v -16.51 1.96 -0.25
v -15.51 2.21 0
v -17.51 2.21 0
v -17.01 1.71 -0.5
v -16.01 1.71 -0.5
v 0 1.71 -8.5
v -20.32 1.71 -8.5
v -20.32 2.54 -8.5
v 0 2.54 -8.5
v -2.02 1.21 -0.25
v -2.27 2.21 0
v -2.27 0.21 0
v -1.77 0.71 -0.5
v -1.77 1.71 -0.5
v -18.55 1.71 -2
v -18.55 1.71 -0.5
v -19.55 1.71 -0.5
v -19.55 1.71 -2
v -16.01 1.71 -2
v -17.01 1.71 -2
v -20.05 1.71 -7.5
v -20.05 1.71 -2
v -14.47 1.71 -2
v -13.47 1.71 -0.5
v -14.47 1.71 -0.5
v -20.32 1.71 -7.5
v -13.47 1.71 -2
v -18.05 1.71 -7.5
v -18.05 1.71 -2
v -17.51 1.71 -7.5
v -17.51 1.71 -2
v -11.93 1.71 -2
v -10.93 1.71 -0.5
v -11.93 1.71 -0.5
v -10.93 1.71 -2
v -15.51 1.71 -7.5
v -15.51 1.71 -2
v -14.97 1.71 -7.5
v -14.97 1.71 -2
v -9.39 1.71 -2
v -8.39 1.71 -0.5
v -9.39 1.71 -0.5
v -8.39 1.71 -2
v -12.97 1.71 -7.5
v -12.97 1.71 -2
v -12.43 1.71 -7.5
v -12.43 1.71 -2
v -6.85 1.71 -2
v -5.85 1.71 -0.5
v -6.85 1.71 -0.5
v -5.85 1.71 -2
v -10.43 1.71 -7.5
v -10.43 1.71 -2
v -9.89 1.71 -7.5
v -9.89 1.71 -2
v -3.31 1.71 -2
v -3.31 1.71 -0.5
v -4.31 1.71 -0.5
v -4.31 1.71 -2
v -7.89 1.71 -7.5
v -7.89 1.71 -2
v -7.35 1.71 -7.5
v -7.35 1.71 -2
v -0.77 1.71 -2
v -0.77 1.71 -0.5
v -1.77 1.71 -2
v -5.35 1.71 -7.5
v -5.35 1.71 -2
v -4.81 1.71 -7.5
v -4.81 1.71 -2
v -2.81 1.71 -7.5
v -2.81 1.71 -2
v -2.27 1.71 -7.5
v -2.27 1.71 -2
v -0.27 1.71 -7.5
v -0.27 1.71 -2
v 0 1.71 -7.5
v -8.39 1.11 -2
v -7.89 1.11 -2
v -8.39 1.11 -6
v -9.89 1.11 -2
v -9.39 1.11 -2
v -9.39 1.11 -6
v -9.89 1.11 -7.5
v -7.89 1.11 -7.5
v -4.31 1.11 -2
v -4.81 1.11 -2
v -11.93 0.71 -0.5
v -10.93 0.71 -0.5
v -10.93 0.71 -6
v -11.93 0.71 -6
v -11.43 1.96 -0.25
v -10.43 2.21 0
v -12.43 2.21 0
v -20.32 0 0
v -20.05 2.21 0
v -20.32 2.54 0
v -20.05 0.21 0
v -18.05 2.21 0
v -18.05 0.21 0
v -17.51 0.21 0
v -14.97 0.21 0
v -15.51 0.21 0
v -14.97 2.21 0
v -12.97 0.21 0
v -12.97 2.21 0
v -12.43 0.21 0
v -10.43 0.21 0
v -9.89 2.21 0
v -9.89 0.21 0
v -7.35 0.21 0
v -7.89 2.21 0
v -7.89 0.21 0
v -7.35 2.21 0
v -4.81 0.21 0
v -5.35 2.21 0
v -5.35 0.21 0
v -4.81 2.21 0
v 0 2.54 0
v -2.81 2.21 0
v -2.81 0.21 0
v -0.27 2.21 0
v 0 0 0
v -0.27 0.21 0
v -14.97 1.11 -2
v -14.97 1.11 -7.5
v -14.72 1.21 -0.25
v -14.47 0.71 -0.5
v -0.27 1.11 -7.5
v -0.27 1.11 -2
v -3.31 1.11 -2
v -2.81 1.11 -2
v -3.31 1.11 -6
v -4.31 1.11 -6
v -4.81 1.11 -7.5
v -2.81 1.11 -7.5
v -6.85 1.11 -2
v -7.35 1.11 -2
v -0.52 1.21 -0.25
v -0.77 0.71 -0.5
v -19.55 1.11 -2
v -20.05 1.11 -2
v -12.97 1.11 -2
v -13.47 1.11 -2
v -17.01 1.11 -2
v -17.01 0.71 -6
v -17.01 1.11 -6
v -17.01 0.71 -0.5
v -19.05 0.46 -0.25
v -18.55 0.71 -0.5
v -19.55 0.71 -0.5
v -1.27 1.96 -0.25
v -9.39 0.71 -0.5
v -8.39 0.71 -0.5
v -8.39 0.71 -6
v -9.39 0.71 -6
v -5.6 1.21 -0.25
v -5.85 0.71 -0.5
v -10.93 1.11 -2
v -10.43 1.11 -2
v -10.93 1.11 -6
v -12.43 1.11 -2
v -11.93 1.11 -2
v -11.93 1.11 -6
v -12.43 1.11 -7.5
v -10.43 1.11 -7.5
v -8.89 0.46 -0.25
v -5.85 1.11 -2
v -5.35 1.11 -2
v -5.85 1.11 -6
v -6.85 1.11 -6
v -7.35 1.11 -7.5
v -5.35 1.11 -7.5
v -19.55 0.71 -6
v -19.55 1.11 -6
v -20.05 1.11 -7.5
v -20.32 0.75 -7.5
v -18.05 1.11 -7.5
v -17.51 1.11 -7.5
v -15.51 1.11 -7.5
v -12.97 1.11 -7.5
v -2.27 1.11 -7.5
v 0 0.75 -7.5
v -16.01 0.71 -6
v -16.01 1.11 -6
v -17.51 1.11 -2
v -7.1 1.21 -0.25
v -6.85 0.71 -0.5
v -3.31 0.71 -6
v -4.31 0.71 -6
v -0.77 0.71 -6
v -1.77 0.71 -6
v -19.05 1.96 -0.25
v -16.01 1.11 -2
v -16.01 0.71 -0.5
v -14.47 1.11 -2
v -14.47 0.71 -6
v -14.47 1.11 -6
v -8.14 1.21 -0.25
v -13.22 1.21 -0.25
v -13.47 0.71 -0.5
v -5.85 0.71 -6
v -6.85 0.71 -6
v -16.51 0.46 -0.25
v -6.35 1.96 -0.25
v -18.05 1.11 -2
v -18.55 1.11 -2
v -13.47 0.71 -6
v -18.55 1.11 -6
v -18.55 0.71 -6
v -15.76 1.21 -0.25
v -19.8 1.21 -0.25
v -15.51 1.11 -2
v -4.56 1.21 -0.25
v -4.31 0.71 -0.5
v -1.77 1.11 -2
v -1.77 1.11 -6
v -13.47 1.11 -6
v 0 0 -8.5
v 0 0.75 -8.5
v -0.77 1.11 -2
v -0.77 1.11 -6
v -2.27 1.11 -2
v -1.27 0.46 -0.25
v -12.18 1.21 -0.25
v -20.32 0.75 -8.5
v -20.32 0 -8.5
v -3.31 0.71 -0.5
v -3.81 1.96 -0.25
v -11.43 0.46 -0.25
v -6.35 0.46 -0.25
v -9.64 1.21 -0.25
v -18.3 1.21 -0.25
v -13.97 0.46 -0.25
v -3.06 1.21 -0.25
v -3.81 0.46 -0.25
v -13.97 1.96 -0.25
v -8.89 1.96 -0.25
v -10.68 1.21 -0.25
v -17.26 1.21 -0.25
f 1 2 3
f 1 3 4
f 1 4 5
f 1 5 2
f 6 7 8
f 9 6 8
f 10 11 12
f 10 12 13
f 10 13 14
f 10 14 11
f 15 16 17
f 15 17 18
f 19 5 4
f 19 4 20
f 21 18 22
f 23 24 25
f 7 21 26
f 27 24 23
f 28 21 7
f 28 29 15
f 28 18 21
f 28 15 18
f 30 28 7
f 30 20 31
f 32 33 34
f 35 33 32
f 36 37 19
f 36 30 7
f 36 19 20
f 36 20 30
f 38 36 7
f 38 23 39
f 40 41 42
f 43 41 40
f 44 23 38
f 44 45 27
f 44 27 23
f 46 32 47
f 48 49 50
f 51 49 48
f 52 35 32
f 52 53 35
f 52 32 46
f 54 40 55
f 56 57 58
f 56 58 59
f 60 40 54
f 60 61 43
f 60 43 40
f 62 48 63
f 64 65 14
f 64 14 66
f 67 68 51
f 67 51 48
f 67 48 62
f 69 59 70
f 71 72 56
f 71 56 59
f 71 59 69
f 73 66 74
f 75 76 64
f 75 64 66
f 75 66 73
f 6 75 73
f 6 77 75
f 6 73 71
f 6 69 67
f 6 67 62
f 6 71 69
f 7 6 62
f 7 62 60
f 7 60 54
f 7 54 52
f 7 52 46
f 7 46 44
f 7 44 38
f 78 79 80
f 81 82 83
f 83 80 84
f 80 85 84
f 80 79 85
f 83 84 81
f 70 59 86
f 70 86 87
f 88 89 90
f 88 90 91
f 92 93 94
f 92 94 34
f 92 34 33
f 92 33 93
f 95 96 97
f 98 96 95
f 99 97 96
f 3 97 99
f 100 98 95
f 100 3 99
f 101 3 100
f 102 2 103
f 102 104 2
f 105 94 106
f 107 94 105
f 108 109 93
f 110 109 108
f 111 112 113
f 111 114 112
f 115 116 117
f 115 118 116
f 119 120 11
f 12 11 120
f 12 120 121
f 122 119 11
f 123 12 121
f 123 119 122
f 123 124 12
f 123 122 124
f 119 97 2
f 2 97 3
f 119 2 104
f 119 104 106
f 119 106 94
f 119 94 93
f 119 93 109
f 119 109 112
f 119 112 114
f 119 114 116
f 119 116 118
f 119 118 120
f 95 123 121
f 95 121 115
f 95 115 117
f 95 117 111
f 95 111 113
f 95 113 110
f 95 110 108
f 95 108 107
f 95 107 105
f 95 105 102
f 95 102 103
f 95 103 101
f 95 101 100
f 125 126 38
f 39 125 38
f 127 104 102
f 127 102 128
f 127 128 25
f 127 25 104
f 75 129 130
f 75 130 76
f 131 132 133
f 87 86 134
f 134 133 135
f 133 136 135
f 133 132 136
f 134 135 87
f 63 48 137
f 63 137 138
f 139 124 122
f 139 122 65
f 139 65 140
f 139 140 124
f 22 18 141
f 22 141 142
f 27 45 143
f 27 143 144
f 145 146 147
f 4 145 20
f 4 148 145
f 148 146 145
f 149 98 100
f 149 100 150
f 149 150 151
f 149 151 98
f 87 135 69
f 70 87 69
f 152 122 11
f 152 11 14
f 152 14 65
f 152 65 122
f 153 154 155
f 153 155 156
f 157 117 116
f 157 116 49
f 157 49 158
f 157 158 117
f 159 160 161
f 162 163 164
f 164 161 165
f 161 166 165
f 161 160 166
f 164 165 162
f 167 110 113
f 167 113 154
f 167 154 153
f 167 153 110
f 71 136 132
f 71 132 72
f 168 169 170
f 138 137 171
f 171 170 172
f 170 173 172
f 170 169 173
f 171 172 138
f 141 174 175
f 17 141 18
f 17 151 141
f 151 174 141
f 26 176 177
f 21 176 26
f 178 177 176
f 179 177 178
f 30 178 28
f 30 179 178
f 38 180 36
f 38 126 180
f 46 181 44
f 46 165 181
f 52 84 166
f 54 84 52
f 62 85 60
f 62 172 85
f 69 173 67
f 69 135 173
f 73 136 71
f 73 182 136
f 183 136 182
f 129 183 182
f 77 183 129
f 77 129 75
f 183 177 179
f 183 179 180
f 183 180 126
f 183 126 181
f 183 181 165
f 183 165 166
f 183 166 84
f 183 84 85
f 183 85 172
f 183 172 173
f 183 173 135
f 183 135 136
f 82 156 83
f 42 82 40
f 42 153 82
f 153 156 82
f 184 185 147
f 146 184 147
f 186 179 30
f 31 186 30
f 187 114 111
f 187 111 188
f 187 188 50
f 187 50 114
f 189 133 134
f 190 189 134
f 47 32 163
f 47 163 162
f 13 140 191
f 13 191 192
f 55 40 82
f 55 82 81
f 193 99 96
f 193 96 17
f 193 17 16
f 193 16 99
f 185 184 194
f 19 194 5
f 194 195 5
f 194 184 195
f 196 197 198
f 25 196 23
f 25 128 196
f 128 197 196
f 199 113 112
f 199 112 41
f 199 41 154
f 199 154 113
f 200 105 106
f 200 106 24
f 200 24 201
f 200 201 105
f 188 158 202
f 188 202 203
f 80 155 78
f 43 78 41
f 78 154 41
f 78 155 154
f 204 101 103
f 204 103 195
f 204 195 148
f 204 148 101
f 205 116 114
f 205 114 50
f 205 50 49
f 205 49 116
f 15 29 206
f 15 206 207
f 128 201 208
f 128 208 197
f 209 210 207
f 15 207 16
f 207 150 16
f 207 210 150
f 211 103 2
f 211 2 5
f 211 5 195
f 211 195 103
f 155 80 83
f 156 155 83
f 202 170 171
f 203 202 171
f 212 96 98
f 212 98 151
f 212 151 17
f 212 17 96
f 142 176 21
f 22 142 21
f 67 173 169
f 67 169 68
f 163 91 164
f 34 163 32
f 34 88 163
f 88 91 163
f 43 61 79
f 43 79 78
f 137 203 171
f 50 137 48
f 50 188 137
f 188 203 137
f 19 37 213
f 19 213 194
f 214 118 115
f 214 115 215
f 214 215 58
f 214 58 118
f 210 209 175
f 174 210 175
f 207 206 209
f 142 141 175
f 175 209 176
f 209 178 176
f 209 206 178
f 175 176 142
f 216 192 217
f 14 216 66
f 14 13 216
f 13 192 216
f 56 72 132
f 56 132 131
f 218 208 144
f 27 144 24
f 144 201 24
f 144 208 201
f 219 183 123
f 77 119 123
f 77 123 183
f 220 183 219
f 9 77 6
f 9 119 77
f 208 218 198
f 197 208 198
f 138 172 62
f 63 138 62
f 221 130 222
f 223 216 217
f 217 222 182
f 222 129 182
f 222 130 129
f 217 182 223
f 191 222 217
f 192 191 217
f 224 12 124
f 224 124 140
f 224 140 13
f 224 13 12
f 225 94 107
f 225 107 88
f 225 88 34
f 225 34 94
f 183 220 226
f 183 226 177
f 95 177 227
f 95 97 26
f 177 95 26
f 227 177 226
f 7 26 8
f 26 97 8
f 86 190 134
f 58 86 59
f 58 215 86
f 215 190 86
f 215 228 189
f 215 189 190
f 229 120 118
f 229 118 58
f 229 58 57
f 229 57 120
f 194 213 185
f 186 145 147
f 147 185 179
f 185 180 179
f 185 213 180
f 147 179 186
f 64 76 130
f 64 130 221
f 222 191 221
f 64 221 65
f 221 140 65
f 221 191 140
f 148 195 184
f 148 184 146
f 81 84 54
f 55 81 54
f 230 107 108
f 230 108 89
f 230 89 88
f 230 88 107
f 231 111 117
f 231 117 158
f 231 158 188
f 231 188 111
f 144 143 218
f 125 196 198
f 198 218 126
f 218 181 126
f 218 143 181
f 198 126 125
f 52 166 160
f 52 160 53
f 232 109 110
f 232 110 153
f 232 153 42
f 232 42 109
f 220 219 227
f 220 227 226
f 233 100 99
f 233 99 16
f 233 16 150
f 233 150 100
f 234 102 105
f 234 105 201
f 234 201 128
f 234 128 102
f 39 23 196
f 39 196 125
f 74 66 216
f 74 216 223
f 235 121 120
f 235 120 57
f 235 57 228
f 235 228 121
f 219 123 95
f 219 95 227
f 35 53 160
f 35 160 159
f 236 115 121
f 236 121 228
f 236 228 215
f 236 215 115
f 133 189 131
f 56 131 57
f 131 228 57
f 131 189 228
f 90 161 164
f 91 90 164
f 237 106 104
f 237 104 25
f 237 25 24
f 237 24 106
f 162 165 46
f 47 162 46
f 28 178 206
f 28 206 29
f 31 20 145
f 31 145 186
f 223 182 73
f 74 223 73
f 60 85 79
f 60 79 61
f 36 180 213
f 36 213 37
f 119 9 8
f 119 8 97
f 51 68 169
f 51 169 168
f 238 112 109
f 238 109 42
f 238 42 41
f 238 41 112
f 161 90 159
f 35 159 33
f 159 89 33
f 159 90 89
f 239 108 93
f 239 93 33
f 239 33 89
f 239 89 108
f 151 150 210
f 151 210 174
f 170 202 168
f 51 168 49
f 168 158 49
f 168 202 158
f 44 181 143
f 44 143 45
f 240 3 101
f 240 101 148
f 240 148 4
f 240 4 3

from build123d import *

# Parameters (mm, degrees)
BOSS_EXTRUDE1_DEPTH = 20.32
SKETCH2_W           = 2
SKETCH2_H           = 0.6
CUT_EXTRUDE1_DEPTH  = 5.5
SKETCH3_W           = 1
SKETCH3_H           = 1
CUT_EXTRUDE2_DEPTH  = 6
SKETCH4_W           = 2
SKETCH4_H           = 2
CUT_EXTRUDE3_DEPTH  = 0.5
CUT_EXTRUDE3_TAPER  = 45
LPATTERN1_COUNT     = 8
LPATTERN1_PITCH     = 2.54


with BuildPart() as part:
    # Sketch1 → Boss-Extrude1 (new body)
    with BuildSketch(Plane(origin=(0, 0, 0), x_dir=(0, 0, -1), z_dir=(1, 0, 0))):
        Polygon((8.5, 2.54), (0, 2.54), (0, 0), (8.5, 0), (8.5, 0.75), (7.5, 0.75), (7.5, 1.709993), (8.5, 1.709993), align=None)
    extrude(amount=-BOSS_EXTRUDE1_DEPTH)

    # Sketch2 → Cut-Extrude1 (cut)
    with BuildSketch(Plane(origin=(0, 0, -7.5), x_dir=(-1, 0, 0), z_dir=(0, 0, -1))):
        with Locations((1.27, 1.409993)):
            Rectangle(SKETCH2_W, SKETCH2_H)
    cut_extrude1 = extrude(amount=-CUT_EXTRUDE1_DEPTH, mode=Mode.SUBTRACT)

    # Sketch3 → Cut-Extrude2 (cut)
    with BuildSketch(Plane(origin=(0, 0, 0), x_dir=(-1, 0, 0), z_dir=(0, 0, -1))):
        with Locations((1.27, 1.209993)):
            Rectangle(SKETCH3_W, SKETCH3_H)
    cut_extrude2 = extrude(amount=CUT_EXTRUDE2_DEPTH, mode=Mode.SUBTRACT)

    # Sketch4 → Cut-Extrude3 (cut)
    with BuildSketch(Plane.XY):
        with Locations((-1.27, 1.209993)):
            Rectangle(SKETCH4_W, SKETCH4_H)
    cut_extrude3 = extrude(amount=-CUT_EXTRUDE3_DEPTH, taper=CUT_EXTRUDE3_TAPER, mode=Mode.SUBTRACT)

    # LPattern1: Cut-Extrude1, Cut-Extrude2, Cut-Extrude3 ×8
    with Locations(*[(-i * LPATTERN1_PITCH, 0, 0) for i in range(1, LPATTERN1_COUNT)]):
        add(cut_extrude1, mode=Mode.SUBTRACT)
        add(cut_extrude2, mode=Mode.SUBTRACT)
        add(cut_extrude3, mode=Mode.SUBTRACT)


solid = part.part
